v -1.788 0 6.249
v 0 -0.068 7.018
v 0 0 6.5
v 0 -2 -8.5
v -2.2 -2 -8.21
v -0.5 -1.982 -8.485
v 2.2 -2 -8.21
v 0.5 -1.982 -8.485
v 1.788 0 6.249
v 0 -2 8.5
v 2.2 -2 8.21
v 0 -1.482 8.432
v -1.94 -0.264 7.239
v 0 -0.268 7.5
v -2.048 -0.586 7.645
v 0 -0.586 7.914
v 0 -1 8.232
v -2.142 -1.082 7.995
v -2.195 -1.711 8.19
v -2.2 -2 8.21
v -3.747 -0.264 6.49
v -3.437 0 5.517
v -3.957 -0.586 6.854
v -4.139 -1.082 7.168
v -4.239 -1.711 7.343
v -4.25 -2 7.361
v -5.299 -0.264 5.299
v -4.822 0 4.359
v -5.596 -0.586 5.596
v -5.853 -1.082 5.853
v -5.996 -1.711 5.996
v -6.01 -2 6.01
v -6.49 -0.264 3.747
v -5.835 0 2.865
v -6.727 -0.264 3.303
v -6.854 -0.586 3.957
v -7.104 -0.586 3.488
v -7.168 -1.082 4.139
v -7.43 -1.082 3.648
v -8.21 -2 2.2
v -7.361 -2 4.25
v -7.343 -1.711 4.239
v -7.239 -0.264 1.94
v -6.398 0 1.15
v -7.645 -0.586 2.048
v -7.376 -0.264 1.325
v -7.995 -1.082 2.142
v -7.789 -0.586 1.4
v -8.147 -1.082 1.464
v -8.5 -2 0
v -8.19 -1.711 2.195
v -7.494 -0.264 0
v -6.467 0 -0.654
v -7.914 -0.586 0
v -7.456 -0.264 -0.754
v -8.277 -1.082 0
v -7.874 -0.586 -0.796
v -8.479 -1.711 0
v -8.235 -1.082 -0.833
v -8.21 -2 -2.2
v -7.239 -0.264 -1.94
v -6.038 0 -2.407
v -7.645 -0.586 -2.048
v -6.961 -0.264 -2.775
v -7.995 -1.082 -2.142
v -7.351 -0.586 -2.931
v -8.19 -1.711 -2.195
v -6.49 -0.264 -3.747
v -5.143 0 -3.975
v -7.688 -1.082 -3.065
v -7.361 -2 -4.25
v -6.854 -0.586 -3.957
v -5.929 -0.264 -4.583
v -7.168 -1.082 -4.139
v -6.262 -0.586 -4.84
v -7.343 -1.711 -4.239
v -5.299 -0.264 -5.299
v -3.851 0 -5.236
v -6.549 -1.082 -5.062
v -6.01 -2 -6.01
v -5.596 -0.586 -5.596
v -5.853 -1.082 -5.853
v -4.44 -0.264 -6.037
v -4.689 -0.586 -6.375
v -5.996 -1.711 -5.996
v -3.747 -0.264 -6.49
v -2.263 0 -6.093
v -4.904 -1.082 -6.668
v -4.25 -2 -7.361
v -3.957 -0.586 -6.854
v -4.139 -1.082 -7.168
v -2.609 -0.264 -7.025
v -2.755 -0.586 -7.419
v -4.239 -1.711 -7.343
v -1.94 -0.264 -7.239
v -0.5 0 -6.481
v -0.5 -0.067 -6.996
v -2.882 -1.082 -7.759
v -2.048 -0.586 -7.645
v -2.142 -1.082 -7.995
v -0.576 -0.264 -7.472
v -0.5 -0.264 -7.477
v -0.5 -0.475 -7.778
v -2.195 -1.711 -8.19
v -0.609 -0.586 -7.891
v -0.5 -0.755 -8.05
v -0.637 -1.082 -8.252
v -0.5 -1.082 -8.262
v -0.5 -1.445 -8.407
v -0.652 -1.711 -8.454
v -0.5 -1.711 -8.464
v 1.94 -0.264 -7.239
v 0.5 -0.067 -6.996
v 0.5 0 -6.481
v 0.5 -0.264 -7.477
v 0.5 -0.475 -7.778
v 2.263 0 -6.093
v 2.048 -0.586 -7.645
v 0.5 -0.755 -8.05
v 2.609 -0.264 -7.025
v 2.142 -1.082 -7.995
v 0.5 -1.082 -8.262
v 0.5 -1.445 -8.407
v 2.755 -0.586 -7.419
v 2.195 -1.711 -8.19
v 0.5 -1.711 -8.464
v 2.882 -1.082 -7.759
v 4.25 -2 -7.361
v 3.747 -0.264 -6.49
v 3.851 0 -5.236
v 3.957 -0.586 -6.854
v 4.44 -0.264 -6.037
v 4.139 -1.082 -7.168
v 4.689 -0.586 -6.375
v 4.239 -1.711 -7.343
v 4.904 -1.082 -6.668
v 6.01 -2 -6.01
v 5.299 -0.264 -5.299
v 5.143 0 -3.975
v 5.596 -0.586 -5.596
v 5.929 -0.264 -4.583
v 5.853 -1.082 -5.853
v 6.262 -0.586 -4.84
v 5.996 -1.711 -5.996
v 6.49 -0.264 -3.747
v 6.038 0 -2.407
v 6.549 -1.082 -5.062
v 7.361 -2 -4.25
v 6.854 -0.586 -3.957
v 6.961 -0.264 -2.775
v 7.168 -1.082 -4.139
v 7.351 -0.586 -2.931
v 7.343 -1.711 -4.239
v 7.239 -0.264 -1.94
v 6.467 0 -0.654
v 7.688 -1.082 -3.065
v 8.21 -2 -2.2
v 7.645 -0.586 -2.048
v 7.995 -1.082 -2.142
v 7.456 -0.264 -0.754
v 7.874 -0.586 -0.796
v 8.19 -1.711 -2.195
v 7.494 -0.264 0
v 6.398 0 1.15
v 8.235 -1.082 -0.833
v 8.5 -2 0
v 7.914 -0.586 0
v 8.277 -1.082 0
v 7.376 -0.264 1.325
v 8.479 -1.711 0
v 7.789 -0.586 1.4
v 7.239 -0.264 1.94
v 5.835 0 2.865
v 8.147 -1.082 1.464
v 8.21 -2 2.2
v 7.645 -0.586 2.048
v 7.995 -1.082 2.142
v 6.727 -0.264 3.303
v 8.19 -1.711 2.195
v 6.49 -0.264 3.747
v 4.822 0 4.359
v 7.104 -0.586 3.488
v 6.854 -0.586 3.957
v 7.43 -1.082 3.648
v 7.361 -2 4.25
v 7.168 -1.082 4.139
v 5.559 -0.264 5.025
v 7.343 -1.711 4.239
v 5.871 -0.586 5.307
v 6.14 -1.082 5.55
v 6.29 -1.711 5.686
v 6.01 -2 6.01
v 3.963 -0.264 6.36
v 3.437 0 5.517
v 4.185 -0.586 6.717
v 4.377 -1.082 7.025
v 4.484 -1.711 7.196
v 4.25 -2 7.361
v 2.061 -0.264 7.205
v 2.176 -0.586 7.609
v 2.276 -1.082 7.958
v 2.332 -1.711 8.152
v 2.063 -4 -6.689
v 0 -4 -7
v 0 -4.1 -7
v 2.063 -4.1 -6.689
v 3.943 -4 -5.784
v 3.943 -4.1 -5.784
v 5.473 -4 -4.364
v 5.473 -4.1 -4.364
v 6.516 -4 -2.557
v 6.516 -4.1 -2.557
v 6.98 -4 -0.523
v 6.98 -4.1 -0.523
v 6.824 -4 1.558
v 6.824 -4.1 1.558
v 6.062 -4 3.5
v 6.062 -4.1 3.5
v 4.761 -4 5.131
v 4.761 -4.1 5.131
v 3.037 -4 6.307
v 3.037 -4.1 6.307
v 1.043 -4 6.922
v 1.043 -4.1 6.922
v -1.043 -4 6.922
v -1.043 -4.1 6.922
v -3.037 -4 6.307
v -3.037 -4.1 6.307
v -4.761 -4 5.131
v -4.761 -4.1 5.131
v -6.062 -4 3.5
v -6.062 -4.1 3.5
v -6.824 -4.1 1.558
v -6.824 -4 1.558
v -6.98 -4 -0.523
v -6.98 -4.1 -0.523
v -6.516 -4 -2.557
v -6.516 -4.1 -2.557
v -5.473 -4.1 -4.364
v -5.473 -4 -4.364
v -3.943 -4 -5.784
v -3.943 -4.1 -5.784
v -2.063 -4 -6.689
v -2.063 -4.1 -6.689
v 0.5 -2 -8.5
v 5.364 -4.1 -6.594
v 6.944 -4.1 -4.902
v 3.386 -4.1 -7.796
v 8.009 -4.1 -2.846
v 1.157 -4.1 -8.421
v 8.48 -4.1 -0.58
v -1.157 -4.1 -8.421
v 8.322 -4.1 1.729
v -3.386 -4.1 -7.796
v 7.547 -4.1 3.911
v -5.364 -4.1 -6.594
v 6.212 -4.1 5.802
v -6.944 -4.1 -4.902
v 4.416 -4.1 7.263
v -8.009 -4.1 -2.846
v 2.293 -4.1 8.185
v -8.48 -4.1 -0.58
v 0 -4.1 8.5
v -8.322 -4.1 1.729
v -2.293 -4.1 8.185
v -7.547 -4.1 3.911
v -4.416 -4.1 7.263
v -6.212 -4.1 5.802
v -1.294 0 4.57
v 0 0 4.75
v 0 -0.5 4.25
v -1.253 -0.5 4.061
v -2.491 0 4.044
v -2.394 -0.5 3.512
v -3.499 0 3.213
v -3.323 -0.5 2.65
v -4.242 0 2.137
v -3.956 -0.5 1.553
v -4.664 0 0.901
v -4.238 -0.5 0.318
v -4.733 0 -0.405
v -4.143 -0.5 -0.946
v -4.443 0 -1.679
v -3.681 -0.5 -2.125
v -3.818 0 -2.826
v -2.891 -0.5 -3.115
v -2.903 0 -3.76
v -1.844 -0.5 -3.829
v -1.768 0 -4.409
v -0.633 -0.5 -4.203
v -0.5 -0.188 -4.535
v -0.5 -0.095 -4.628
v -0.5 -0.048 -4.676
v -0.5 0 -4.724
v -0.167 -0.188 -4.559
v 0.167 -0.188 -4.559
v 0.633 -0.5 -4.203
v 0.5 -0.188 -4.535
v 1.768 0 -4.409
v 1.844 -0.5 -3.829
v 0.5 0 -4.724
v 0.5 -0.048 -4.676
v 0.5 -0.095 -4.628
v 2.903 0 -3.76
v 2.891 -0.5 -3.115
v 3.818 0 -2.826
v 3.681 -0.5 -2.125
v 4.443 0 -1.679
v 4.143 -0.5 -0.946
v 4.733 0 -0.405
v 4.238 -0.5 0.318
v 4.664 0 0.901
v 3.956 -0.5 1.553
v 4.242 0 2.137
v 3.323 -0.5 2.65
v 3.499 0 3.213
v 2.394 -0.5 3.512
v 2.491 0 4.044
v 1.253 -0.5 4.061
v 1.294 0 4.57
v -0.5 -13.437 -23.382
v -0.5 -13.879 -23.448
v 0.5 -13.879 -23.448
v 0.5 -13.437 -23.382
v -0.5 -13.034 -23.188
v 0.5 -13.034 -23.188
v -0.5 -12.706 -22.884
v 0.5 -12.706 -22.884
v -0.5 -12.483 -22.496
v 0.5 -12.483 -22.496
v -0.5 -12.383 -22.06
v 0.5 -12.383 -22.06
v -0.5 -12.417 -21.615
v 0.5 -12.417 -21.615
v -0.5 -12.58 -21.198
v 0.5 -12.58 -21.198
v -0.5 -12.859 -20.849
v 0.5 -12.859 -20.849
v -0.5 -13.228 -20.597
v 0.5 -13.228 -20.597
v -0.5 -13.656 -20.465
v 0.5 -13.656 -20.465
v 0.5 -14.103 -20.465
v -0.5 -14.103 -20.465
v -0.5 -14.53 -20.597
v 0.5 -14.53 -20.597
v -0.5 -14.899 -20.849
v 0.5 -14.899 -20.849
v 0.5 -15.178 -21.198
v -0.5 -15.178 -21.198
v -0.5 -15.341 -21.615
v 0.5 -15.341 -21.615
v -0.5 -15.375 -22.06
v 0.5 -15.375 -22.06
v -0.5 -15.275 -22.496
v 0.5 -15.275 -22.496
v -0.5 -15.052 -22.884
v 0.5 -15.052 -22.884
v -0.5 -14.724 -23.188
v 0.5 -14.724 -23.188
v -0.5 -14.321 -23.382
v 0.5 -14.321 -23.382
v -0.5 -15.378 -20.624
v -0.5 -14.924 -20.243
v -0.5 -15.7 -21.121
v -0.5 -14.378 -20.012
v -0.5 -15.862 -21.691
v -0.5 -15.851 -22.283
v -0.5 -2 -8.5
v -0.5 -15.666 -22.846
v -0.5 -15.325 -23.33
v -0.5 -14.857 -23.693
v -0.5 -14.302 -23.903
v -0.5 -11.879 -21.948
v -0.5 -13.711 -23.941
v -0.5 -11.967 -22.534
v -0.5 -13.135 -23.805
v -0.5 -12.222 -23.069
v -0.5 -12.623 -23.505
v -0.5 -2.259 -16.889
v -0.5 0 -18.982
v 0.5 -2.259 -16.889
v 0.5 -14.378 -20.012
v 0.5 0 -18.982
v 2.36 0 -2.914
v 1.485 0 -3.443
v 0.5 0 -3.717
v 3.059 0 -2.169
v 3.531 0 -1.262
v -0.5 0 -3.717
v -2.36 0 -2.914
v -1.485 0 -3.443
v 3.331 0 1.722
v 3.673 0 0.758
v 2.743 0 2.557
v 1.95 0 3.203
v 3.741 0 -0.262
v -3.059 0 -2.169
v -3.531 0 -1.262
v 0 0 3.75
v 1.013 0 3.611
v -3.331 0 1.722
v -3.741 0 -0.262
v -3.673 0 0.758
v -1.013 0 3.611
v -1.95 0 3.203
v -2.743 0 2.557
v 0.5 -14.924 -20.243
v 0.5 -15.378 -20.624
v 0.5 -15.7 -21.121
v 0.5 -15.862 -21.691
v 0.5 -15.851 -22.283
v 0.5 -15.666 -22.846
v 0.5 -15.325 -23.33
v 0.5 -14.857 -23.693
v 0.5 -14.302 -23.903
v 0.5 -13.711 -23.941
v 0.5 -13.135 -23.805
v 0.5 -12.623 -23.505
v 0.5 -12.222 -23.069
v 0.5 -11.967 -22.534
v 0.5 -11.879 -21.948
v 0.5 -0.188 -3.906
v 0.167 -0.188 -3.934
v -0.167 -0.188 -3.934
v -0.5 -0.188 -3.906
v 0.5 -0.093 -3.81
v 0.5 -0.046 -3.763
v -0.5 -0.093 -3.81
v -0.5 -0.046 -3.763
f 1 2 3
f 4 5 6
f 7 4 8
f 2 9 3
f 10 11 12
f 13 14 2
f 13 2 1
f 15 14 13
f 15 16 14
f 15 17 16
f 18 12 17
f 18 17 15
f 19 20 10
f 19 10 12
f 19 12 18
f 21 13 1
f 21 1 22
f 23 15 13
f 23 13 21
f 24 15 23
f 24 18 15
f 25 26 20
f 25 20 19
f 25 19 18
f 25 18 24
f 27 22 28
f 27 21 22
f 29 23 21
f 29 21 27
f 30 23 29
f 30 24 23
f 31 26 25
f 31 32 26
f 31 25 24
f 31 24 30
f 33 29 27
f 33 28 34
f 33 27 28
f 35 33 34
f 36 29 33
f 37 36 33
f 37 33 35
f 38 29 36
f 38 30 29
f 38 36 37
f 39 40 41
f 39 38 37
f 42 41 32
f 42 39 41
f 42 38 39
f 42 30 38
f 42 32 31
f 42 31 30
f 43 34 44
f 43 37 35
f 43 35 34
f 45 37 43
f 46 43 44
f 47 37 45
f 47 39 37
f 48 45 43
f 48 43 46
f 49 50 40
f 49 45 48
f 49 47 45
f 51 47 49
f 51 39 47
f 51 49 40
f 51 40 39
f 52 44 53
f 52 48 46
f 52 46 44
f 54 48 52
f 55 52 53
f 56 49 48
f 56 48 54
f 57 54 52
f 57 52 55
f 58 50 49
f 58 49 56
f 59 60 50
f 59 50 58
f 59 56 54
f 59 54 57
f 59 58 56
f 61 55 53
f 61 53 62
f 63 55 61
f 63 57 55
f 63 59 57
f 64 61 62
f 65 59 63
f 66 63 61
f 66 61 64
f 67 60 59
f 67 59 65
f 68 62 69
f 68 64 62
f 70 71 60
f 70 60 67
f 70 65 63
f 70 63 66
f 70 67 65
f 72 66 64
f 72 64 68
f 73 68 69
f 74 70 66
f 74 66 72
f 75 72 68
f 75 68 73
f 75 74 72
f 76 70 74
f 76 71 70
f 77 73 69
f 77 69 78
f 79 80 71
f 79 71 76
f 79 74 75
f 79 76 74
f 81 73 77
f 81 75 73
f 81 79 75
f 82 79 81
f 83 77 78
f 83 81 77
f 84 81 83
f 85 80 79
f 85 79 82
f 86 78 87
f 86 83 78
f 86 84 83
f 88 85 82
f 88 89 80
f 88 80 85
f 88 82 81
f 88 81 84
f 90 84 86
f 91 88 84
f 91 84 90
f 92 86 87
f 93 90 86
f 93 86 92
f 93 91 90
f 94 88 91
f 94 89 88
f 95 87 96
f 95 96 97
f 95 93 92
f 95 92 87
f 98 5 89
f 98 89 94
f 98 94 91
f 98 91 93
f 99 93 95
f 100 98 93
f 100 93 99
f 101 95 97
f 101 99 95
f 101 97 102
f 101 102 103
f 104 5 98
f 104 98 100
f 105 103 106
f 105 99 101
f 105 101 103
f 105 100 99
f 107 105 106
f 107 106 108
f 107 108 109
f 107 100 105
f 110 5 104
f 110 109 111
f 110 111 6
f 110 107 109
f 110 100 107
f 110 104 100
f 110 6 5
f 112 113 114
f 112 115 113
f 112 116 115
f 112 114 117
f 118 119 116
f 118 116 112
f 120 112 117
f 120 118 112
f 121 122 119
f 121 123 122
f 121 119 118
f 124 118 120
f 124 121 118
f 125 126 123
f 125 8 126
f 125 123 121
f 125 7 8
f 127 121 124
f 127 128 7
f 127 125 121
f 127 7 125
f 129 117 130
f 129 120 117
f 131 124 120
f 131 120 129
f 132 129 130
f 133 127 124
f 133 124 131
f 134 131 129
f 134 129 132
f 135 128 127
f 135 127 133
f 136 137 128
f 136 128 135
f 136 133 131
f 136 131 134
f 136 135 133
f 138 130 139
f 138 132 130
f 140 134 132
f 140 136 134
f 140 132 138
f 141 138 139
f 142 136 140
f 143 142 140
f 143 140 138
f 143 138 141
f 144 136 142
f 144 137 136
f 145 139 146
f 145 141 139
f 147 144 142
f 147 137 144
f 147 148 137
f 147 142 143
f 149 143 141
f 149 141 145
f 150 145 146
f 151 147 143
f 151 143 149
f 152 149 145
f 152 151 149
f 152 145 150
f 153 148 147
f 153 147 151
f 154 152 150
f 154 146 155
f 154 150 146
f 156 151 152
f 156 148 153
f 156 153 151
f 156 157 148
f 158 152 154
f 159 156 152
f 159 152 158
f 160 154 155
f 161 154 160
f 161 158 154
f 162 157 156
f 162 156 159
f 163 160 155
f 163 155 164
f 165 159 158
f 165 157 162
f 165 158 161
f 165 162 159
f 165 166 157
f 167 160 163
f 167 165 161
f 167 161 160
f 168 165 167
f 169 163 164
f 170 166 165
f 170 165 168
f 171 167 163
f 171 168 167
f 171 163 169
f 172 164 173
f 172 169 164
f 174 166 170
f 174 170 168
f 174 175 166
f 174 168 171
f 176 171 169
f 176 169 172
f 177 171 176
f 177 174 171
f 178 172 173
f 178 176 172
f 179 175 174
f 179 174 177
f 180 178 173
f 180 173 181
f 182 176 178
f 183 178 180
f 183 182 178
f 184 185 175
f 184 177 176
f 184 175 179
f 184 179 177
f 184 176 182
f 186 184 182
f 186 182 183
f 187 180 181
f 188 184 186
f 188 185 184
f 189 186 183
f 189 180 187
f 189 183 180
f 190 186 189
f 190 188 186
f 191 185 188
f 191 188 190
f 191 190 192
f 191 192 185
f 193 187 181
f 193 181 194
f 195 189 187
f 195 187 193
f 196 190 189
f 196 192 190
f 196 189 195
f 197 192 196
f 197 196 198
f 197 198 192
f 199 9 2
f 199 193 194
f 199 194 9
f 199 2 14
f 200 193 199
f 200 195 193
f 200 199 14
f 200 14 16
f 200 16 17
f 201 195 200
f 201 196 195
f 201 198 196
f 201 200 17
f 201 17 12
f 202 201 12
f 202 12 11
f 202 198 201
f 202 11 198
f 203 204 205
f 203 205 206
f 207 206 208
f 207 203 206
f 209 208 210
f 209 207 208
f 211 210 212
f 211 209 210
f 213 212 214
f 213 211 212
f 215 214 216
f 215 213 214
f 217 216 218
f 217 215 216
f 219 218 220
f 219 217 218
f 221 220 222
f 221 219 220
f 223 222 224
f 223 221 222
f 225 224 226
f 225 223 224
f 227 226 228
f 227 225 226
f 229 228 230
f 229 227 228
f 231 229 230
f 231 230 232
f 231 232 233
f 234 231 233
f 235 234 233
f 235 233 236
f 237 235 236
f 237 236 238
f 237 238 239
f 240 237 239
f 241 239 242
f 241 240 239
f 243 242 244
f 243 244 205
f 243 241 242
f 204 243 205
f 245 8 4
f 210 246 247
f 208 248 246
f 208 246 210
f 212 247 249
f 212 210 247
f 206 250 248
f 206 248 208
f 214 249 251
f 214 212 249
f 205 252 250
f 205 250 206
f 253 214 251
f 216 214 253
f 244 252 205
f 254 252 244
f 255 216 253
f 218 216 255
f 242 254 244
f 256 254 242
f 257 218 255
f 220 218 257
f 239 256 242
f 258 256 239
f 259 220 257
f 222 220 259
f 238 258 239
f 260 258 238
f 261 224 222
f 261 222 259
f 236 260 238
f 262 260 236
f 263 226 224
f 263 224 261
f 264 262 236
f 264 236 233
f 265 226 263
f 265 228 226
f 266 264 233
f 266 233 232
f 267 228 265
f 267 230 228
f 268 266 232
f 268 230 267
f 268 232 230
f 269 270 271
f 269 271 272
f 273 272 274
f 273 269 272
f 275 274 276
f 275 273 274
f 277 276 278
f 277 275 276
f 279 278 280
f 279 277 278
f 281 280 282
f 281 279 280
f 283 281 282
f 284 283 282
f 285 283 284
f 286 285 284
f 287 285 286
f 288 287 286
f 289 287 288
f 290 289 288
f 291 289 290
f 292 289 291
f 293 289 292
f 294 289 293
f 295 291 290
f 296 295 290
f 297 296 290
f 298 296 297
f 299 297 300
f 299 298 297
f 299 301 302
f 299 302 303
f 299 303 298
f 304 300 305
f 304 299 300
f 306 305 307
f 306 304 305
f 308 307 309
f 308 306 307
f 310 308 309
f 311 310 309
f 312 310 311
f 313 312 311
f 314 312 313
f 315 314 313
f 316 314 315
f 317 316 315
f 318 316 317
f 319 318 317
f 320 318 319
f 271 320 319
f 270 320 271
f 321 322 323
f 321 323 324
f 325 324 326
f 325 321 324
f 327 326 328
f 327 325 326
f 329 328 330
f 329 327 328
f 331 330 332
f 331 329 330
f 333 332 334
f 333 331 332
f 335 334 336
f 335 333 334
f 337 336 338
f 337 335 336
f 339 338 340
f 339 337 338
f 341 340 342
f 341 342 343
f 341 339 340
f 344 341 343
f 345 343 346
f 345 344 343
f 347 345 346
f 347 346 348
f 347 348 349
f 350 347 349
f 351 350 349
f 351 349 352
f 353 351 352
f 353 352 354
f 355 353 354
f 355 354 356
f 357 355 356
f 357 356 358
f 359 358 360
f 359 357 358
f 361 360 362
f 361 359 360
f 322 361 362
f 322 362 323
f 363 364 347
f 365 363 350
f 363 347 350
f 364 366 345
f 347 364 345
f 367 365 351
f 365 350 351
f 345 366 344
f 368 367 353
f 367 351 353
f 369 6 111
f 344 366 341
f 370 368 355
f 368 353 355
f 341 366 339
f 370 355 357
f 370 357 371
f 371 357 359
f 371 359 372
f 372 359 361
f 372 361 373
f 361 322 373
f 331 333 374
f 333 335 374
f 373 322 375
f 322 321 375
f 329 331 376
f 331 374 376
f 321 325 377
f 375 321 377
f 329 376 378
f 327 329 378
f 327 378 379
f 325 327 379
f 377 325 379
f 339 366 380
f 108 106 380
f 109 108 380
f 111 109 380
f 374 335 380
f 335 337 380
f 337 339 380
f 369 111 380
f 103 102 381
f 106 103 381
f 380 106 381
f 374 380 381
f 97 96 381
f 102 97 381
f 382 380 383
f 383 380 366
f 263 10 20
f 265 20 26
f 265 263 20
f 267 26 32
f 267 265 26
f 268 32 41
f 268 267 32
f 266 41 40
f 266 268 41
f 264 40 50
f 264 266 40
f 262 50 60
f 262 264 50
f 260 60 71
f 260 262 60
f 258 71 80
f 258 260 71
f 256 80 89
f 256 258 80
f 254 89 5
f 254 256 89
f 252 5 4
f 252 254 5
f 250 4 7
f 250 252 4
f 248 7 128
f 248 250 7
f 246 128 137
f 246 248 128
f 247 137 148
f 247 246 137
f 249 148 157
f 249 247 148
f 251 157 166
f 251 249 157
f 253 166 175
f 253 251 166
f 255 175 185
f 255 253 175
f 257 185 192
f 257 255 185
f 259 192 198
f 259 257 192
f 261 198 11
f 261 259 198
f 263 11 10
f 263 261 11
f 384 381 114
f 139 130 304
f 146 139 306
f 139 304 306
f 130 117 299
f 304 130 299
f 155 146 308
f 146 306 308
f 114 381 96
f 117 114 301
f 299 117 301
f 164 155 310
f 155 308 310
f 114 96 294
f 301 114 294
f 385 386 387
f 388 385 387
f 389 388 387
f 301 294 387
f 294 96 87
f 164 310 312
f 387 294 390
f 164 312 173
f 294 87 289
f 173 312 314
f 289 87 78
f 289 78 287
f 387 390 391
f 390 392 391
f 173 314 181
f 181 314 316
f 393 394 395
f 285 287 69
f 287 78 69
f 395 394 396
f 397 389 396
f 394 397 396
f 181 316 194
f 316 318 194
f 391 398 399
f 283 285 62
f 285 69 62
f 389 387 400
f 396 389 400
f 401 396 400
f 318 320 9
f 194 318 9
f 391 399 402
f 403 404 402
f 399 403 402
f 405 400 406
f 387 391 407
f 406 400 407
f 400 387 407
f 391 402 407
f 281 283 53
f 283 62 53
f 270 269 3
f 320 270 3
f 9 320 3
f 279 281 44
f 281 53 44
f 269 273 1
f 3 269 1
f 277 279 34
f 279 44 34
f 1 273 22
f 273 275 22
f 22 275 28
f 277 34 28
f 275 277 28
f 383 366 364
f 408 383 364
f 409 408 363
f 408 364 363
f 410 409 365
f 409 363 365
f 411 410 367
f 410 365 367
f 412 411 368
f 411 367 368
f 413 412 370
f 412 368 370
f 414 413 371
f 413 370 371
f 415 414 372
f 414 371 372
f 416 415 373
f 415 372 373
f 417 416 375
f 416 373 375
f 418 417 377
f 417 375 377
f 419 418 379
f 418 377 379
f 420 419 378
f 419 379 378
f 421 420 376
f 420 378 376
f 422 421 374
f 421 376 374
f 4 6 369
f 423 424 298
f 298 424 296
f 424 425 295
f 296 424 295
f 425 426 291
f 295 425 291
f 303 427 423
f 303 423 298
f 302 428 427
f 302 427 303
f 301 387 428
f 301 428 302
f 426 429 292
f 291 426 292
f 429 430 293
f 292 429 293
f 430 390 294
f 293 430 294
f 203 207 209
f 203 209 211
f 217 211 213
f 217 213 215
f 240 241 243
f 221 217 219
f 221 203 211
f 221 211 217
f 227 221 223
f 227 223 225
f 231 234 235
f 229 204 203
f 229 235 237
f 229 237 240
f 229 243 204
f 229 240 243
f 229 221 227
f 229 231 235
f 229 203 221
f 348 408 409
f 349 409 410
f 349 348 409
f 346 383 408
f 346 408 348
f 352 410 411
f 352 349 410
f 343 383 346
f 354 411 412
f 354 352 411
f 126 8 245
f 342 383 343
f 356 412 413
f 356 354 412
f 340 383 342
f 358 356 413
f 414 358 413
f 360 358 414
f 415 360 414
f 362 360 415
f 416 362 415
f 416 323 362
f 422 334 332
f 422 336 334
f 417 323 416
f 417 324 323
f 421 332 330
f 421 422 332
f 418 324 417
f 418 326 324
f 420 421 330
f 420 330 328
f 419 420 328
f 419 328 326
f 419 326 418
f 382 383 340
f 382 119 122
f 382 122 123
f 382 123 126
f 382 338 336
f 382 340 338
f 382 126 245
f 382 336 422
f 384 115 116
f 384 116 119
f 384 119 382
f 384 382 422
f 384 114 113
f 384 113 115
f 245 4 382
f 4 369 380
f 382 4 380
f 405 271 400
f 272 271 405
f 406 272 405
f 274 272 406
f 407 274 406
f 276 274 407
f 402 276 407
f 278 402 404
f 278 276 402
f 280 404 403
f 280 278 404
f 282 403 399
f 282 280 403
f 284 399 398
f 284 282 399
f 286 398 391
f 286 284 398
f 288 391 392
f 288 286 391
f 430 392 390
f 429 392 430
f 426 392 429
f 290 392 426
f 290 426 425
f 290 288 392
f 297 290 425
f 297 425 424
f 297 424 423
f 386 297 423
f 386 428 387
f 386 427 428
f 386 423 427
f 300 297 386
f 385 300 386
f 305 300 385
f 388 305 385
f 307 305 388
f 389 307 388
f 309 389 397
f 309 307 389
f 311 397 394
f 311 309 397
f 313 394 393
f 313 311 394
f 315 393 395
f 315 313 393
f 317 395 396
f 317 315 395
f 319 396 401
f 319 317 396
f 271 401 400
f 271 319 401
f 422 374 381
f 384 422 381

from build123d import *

# Parameters (mm, degrees)
FILLET1_R                = 2
SKETCH5_R                = 8.5
SKETCH5_R_2              = 7
BOSS_EXTRUDE1_DEPTH      = 0.1
BOSS_EXTRUDE2_DEPTH      = 0.5
BOSS_EXTRUDE2_DEPTH_BACK = 0.5
SKETCH6_R                = 1.5


with BuildPart() as part:
    # Sketch4 → Revolve1 (revolve)
    with BuildSketch(Plane(origin=(0, 0, 0), x_dir=(0, 0, -1), z_dir=(1, 0, 0))):
        Polygon((0, 0), (-3.75, 0), (-4.25, -0.5), (-4.75, 0), (-8.5, 0), (-8.5, -4), (0, -4), align=None)
    revolve(axis=Axis((0, 1.890471386, 0), (0, -1, 0)))

    # Fillet1
    fillet1_edges = [part.edges().sort_by_distance(p)[0] for p in [
        (0, 0, -8.5),
    ]]
    fillet(fillet1_edges, radius=FILLET1_R)



with BuildPart() as body_2:
    # Sketch5 → Boss-Extrude1 (new body)
    with BuildSketch(Plane.XZ.offset(4)):
        Circle(SKETCH5_R)
        Circle(SKETCH5_R_2, mode=Mode.SUBTRACT)
    extrude(amount=BOSS_EXTRUDE1_DEPTH)


with BuildPart() as part_1:
    add(part.part)

    add(body_2.part)  # Boss-Extrude2 merges body 2
    # Sketch6 → Boss-Extrude2 (add, two sides: drawn at the far end of the back side and taken through both)
    with BuildSketch(Plane(origin=(0, 0, 0), x_dir=(0, 0, -1), z_dir=(1, 0, 0)).offset(-BOSS_EXTRUDE2_DEPTH_BACK)):
        with BuildLine():
            Line((18.982403574, 0), (0, 0))
            Line((0, 0), (0, -0.187703371))
            Line((0, -0.187703371), (7.006743711, -0.187703371))
            Line((7.006743711, -0.187703371), (8.5, -2))
            Line((8.5, -2), (16.888756121, -2.259364745))
            Line((16.888756121, -2.259364745), (20.011674859, -14.378186982))
            ThreePointArc((20.011674859, -14.378186982), (23.529251649, -15.104228972), (21.948404132, -11.879108109))
            Line((21.948404132, -11.879108109), (18.982403574, 0))
        make_face()
        with Locations((21.948404132, -13.879108109)):
            Circle(SKETCH6_R, mode=Mode.SUBTRACT)
    extrude(amount=BOSS_EXTRUDE2_DEPTH + BOSS_EXTRUDE2_DEPTH_BACK)


solid = part_1.part
